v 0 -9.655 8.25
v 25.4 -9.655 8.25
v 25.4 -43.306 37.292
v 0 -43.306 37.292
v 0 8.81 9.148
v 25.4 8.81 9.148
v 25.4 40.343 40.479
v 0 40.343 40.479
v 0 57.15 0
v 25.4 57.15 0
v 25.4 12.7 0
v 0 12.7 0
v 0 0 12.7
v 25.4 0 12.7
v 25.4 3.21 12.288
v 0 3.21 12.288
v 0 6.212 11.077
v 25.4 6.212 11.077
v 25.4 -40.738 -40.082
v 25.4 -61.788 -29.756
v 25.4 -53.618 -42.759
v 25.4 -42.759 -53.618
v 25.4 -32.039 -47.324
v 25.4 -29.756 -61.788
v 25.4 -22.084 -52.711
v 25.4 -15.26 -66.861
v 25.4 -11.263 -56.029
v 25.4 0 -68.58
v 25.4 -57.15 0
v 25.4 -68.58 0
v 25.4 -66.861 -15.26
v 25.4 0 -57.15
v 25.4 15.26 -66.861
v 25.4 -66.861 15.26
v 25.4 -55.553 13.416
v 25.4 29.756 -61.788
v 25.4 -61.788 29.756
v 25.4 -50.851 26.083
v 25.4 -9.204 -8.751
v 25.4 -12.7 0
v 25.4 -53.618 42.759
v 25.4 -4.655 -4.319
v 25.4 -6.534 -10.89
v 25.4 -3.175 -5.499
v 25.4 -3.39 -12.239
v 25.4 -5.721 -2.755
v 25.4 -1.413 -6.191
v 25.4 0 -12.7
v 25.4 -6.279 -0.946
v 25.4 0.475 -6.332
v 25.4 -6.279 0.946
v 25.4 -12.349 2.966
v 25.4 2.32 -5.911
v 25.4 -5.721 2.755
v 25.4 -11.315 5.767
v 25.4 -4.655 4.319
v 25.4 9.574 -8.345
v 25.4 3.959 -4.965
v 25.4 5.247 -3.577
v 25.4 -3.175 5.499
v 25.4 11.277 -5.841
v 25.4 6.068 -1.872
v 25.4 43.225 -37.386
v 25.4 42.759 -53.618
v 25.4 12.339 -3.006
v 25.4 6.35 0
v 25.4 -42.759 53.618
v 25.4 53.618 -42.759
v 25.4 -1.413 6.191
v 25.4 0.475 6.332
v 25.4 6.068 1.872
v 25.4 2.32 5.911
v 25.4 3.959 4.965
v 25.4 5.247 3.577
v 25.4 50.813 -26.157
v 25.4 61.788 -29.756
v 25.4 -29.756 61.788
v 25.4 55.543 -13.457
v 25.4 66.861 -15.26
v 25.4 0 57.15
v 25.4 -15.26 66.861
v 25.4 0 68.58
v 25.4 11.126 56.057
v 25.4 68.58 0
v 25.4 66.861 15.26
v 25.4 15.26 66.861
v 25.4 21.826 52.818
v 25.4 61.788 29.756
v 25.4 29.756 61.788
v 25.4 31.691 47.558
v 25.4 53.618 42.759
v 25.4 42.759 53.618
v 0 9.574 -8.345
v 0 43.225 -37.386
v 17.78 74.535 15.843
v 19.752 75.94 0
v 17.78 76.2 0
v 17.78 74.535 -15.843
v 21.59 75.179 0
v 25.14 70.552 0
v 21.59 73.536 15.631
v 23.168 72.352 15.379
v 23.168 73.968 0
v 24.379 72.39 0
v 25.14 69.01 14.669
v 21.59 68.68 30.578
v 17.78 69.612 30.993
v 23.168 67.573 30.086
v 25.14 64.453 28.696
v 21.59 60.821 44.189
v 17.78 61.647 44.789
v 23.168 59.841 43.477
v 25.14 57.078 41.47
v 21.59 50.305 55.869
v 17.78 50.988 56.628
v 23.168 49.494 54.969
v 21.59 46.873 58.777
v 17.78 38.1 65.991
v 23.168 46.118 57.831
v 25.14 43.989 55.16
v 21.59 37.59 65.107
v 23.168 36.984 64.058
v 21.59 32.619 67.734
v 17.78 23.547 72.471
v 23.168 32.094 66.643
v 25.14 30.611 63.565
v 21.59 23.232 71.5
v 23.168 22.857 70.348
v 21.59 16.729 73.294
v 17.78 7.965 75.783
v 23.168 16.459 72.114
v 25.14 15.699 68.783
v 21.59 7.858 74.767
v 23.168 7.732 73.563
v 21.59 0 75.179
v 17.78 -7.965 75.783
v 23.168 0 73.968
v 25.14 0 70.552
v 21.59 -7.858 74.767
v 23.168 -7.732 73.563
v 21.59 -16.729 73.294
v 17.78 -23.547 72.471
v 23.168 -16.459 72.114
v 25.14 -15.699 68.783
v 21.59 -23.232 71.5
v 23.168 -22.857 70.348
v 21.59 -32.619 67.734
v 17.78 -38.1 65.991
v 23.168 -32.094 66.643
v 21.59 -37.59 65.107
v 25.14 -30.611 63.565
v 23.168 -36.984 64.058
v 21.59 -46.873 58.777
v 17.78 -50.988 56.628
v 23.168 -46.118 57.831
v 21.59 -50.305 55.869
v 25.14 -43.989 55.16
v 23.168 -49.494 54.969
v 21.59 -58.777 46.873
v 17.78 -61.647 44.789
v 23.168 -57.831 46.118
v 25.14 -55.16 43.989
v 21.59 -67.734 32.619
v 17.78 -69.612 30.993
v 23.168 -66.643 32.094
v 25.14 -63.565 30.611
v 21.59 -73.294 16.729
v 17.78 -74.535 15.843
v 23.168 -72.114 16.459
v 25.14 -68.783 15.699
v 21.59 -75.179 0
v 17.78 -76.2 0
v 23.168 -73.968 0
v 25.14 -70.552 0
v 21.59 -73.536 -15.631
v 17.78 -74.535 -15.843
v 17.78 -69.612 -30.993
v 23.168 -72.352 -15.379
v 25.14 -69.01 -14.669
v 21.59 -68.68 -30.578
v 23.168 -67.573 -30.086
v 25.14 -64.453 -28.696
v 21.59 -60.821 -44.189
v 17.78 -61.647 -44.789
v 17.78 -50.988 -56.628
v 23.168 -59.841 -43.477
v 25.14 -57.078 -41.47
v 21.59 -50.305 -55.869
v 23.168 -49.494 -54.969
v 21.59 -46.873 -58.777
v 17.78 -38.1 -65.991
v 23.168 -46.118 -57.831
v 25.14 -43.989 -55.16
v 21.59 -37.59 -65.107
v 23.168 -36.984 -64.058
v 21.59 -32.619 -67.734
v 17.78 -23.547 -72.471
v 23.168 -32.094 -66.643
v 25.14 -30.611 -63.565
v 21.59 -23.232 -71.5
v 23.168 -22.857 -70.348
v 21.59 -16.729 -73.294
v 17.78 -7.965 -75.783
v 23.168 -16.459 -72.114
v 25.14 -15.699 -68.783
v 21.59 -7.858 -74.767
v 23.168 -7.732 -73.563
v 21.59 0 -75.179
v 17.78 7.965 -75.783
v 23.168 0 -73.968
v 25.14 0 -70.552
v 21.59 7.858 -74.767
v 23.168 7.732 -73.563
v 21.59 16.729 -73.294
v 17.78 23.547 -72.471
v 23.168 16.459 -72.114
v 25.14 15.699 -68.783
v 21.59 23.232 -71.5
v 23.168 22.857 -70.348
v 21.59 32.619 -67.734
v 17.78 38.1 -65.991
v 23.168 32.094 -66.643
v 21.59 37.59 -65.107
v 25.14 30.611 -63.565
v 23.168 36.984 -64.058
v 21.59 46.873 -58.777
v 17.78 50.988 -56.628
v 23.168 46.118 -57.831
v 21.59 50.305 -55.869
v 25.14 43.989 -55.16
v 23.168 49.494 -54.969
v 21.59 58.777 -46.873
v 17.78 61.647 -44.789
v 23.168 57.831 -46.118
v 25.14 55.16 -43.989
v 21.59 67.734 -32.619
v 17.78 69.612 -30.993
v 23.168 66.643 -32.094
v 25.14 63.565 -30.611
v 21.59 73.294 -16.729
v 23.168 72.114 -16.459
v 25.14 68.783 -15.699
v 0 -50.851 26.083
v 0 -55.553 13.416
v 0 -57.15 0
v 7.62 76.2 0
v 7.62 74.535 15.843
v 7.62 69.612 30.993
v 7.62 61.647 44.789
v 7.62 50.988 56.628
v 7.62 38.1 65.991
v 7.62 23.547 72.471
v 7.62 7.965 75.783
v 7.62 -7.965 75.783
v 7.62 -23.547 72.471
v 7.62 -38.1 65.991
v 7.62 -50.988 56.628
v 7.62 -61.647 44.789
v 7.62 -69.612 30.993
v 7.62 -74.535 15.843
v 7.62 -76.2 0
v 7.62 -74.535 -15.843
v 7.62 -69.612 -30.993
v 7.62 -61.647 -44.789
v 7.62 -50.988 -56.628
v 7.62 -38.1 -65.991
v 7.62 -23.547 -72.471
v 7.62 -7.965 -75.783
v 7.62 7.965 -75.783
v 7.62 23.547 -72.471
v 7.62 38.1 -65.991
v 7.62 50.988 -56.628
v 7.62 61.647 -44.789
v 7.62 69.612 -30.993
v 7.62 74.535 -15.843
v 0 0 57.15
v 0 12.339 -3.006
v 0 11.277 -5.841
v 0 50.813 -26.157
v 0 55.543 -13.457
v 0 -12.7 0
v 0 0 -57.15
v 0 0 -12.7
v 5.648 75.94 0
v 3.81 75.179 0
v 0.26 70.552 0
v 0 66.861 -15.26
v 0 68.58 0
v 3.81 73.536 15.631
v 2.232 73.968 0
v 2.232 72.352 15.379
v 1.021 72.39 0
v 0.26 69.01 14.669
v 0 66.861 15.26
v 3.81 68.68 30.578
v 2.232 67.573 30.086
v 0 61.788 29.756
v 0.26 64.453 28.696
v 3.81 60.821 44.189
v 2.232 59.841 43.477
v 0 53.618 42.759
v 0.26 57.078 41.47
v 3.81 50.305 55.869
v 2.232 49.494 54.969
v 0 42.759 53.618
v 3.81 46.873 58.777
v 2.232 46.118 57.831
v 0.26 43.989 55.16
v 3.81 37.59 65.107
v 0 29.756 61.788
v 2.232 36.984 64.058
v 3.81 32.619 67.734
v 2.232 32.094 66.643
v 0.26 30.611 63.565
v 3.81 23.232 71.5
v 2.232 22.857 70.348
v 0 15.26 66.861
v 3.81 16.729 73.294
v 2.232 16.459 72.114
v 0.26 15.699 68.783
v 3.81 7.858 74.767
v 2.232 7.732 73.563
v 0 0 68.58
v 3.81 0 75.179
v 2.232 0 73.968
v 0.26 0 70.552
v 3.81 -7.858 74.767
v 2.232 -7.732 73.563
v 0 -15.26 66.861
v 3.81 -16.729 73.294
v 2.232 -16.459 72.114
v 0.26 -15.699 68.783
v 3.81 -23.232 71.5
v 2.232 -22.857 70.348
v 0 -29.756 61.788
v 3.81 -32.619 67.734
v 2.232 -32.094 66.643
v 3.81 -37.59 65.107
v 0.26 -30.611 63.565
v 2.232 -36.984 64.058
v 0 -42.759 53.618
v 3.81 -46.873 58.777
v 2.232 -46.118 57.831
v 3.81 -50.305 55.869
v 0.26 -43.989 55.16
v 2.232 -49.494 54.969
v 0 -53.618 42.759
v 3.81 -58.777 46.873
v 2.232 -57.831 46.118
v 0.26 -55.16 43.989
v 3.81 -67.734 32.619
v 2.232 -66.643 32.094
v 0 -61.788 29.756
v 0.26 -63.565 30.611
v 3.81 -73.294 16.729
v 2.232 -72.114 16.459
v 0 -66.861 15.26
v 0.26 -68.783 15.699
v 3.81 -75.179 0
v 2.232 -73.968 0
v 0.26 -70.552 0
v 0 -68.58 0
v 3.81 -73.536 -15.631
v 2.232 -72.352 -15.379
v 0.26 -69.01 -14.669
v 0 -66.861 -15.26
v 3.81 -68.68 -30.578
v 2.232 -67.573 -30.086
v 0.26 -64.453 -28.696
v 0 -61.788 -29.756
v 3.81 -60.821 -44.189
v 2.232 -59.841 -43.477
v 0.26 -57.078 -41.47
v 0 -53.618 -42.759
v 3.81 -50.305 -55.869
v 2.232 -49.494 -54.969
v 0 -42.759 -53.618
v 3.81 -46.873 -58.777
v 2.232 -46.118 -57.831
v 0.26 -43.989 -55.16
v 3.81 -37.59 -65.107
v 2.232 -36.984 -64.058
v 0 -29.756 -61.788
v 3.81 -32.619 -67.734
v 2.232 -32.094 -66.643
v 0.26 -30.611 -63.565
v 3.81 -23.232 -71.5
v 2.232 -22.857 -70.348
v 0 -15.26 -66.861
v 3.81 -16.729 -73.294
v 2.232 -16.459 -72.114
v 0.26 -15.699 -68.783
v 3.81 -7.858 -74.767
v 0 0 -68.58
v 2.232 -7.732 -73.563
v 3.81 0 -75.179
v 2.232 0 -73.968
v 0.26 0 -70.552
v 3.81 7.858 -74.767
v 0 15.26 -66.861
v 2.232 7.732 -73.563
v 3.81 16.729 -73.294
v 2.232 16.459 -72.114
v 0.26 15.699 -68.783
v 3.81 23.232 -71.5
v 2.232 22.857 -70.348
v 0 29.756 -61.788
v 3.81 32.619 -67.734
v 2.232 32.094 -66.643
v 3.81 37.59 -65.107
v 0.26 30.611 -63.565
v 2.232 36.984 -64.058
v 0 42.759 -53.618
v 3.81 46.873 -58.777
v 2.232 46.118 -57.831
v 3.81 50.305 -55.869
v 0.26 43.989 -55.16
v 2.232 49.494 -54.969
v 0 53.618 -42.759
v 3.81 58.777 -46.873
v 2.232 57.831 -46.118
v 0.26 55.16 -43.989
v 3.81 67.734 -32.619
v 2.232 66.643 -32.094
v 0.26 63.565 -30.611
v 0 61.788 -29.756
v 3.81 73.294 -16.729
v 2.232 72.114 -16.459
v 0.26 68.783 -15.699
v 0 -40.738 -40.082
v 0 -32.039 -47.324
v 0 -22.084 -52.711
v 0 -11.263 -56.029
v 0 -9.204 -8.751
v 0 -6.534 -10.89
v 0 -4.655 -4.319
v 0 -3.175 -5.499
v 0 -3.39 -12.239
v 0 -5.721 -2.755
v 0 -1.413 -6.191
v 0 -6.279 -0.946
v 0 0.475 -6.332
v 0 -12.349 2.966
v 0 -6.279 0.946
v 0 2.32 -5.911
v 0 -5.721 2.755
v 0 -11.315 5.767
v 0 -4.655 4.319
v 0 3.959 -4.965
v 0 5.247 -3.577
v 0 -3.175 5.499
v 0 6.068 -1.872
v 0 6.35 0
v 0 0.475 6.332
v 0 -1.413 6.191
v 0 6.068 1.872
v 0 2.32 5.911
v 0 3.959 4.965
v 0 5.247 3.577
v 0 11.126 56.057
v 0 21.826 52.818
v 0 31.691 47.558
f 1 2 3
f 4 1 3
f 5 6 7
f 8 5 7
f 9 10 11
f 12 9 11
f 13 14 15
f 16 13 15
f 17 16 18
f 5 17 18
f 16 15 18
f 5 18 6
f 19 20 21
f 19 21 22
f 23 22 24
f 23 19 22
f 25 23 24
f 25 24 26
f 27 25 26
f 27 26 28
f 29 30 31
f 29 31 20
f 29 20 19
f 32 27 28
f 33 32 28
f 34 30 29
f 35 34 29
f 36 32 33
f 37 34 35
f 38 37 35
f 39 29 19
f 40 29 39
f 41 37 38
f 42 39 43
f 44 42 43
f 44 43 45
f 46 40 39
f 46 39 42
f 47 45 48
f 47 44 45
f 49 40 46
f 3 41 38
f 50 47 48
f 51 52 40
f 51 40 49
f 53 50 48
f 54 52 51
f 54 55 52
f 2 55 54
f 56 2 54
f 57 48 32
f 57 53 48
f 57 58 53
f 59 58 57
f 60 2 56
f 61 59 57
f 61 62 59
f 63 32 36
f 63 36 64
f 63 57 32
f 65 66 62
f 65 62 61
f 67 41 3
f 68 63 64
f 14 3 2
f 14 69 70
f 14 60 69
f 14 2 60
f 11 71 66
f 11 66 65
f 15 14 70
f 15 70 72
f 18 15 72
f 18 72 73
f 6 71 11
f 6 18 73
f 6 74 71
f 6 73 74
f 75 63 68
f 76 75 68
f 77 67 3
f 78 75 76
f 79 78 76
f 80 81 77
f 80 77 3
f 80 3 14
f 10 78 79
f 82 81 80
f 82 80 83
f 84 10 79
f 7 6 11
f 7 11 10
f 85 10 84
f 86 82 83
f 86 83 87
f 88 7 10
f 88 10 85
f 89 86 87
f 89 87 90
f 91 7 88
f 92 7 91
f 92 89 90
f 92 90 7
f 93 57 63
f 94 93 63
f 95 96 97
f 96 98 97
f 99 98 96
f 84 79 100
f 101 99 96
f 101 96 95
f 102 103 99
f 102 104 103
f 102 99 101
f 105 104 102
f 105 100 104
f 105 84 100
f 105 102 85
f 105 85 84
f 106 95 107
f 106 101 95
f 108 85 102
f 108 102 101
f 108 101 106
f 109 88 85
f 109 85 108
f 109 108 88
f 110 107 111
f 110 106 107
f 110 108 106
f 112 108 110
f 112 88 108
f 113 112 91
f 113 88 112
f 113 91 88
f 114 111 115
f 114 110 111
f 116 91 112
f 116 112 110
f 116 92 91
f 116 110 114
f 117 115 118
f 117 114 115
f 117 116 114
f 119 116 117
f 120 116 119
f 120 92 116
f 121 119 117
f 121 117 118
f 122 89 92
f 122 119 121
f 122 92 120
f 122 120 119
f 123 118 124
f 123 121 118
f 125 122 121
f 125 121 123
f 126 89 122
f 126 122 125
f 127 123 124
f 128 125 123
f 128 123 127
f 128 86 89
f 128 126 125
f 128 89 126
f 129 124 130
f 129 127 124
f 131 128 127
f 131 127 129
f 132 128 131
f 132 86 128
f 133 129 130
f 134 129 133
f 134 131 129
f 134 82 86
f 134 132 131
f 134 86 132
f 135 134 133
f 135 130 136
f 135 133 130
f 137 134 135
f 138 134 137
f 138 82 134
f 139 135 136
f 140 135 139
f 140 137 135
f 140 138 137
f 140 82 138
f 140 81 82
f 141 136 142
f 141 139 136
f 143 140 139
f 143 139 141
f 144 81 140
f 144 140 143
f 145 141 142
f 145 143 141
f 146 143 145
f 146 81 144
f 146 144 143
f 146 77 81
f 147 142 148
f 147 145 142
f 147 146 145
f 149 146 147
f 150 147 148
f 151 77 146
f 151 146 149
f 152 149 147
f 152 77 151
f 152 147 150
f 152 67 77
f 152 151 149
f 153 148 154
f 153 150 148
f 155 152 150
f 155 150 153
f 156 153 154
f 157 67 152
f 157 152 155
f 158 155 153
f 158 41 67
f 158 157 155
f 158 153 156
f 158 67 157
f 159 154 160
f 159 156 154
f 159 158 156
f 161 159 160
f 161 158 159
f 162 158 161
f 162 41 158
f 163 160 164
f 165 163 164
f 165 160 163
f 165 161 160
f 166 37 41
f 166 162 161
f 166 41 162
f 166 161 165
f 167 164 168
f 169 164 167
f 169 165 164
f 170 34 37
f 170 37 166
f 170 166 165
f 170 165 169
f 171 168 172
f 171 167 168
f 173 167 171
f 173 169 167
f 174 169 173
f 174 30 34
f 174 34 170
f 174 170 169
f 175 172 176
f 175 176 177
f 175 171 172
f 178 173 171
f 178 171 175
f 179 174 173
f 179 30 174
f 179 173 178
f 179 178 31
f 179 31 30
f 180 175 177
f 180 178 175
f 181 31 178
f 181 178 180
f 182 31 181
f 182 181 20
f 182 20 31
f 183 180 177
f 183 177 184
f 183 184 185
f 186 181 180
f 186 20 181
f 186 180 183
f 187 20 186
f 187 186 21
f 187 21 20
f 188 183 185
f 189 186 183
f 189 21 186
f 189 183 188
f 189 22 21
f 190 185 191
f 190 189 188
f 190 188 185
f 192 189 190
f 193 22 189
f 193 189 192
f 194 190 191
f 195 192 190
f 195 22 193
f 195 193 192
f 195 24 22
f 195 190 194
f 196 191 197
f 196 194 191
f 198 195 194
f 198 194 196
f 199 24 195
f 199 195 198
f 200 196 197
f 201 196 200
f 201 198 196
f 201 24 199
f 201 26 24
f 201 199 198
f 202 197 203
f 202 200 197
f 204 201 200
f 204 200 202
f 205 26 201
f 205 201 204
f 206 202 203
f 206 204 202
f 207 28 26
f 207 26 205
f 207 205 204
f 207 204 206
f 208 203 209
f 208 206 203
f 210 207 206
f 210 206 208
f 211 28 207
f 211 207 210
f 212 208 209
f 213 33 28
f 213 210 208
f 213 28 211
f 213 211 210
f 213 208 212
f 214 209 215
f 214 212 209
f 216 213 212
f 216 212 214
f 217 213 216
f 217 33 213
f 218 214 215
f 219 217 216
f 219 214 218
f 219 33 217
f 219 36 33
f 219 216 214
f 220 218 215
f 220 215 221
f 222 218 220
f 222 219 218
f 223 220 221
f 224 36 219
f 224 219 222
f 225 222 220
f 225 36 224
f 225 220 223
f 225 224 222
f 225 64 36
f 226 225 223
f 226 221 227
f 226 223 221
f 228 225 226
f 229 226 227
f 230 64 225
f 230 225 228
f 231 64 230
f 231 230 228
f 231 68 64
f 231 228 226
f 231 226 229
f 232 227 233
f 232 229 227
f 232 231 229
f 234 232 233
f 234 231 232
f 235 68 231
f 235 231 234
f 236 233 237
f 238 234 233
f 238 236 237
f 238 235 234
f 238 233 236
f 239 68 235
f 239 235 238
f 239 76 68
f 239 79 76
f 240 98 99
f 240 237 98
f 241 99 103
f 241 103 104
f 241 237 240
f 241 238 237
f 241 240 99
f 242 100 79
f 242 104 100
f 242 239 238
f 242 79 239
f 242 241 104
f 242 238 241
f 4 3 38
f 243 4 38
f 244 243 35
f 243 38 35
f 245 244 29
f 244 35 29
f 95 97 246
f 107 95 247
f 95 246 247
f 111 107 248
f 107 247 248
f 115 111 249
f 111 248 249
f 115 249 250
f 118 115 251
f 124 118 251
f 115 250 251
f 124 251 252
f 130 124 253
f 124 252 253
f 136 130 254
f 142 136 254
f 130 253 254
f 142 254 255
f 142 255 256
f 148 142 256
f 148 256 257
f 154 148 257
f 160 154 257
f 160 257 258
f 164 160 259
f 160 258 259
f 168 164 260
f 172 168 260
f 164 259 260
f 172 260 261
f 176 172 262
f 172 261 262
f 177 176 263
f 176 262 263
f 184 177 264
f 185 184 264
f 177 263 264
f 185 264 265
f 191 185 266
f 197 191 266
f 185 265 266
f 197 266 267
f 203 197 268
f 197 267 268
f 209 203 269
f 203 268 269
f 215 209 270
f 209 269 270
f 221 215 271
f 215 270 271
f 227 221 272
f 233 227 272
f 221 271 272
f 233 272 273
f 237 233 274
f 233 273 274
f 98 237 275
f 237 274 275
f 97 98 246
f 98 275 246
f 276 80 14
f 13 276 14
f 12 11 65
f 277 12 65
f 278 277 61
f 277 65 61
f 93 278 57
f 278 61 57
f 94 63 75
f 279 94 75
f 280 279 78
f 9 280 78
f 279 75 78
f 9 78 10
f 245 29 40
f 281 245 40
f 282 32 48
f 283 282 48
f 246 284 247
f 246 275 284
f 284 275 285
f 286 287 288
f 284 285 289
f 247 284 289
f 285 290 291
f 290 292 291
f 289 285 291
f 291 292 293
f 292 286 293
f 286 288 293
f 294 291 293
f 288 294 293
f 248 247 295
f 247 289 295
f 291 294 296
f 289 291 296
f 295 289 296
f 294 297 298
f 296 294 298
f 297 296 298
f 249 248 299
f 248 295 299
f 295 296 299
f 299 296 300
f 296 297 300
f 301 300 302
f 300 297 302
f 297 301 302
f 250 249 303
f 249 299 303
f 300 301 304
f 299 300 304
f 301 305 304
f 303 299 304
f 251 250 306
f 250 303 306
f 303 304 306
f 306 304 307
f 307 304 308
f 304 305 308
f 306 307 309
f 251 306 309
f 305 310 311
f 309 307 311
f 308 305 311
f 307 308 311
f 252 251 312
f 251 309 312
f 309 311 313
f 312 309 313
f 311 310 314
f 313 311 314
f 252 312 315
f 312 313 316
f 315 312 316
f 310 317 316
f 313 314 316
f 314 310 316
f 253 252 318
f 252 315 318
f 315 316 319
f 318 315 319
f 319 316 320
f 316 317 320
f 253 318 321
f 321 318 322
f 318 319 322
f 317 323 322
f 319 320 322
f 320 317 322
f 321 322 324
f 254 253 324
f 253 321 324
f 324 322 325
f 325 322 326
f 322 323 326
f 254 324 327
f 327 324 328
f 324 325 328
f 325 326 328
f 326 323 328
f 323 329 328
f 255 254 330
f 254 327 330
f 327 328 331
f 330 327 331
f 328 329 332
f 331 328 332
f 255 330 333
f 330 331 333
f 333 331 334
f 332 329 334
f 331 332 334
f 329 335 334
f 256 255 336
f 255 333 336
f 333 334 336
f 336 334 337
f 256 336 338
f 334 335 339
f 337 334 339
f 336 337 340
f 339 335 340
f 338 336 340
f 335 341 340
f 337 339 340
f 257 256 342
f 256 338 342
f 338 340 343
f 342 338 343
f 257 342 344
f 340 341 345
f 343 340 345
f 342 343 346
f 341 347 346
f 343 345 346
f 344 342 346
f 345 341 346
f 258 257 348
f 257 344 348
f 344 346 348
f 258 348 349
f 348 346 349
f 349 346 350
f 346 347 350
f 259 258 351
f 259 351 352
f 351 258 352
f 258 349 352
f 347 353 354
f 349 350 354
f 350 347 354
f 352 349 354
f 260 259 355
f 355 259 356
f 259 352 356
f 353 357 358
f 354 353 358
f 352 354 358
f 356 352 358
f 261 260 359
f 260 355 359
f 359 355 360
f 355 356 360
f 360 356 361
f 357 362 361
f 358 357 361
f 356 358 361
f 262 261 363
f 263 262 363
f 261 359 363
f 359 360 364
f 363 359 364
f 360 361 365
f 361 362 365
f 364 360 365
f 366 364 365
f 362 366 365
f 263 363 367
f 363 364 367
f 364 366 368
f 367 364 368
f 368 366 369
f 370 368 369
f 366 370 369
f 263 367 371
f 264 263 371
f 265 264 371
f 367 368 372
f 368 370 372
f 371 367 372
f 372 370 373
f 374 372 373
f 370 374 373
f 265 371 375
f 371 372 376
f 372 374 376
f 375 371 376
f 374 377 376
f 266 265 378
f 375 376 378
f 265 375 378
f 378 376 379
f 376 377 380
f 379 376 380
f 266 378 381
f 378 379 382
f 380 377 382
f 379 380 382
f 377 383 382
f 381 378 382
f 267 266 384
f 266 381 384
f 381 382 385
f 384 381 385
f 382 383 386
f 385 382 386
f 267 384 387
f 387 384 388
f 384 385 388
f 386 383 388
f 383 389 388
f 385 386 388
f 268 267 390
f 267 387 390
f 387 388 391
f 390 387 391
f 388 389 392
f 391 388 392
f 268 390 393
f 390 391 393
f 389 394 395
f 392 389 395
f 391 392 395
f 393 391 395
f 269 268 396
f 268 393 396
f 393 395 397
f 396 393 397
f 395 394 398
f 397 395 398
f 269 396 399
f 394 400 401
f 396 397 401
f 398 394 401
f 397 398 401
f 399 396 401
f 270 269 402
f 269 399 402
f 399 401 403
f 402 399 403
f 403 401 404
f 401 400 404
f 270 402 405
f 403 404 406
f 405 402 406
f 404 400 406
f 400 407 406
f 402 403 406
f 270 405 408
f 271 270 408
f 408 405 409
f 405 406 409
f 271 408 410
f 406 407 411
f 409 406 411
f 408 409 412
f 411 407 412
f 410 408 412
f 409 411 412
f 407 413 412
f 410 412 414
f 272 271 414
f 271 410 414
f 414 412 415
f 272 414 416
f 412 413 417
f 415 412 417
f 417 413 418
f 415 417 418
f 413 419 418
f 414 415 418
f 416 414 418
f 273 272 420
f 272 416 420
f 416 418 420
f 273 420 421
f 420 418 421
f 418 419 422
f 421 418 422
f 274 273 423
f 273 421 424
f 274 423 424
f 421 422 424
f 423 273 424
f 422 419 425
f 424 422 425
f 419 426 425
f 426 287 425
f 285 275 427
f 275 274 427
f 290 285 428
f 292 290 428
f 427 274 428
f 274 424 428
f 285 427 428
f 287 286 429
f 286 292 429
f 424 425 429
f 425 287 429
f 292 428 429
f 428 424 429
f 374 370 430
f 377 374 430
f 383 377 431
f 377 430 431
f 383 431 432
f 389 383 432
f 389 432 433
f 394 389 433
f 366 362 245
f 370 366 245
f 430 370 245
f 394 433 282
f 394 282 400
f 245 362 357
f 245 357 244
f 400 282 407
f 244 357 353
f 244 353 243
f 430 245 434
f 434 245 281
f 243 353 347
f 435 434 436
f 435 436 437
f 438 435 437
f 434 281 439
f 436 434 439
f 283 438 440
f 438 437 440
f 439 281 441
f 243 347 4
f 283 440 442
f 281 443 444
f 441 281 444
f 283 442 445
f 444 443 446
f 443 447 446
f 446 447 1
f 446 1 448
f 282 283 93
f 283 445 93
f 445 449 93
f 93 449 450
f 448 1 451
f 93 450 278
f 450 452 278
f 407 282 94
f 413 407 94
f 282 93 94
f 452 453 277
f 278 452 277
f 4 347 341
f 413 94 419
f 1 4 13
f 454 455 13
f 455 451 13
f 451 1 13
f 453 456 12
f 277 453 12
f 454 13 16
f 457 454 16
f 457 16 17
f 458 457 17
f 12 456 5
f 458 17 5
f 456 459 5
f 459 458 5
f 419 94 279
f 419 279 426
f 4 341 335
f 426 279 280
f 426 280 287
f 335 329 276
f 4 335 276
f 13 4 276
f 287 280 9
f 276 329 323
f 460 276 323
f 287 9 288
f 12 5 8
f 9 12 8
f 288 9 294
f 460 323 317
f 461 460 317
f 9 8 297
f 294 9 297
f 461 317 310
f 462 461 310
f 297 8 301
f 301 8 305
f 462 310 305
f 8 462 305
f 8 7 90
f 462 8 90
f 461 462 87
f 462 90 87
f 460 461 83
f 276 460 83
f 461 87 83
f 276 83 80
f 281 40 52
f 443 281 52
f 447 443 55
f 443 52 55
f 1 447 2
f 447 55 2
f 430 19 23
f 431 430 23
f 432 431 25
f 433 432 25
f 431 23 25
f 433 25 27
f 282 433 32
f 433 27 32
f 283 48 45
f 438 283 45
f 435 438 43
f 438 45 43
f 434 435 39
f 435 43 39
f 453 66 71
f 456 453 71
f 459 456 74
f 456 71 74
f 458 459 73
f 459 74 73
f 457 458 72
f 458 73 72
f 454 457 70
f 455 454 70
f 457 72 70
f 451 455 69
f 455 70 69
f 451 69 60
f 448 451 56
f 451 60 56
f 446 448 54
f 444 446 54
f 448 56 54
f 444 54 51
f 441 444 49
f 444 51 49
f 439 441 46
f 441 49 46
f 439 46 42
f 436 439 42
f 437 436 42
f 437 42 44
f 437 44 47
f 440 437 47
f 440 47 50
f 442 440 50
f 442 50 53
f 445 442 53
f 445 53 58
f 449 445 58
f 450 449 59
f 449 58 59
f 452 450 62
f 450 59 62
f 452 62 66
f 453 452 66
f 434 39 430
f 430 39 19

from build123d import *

# Parameters (mm, degrees)
F0_R     = 76.2
F1_DEPTH = 25.4
F2_R     = 6.35
F3_DEPTH = 25.4
F5_DEPTH = 25.4
F6_R     = 7.62


with BuildPart() as f1:
    # F0 (on Right) → F1 (new body)
    with BuildSketch(Plane.YZ):
        Circle(F0_R)
    extrude(amount=F1_DEPTH)

    # F2 (on face) → F3 (cut)
    with BuildSketch(Plane.YZ.offset(25.4)):
        Circle(F2_R)
    extrude(amount=-F3_DEPTH, mode=Mode.SUBTRACT)

    # F4 (on face) → F5 (cut)
    with BuildSketch(Plane.YZ.offset(25.4)):
        with BuildLine():
            ThreePointArc((-40.737736199, -40.0819080058), (-22.0844001217, -52.7105470591), (0, -57.15))
            Line((0, -57.15), (0, -12.7))
            ThreePointArc((0, -12.7), (-5.0078416892, -11.6709691807), (-9.2041521286, -8.7506333253))
            Line((-9.2041521286, -8.7506333253), (-40.737736199, -40.0819080058))
        make_face()
        with BuildLine():
            ThreePointArc((43.2249520119, -37.3861742301), (53.5557116818, -19.947637611), (57.15, 0))
            Line((57.15, 0), (12.7, 0))
            ThreePointArc((12.7, 0), (11.89277789, -4.4555397045), (9.5737269199, -8.3446841081))
            Line((9.5737269199, -8.3446841081), (43.2249520119, -37.3861742301))
        make_face()
        with BuildLine():
            Line((8.8096923922, 9.1476401304), (40.3432764626, 40.4789148108))
            ThreePointArc((40.3432764626, 40.4789148108), (21.8260454338, 52.8180484373), (0, 57.15))
            Line((0, 57.15), (0, 12.7))
            ThreePointArc((0, 12.7), (4.749472094, 11.7784767618), (8.8096923922, 9.1476401304))
        make_face()
        with BuildLine():
            Line((-9.6552608984, 8.2502082994), (-43.3064859904, 37.2916984215))
            ThreePointArc((-43.3064859904, 37.2916984215), (-53.57745876, 19.889153145), (-57.15, 0))
            Line((-57.15, 0), (-12.7, 0))
            ThreePointArc((-12.7, 0), (-11.9145250306, 4.3970550708), (-9.6552608984, 8.2502082994))
        make_face()
    extrude(amount=-F5_DEPTH, mode=Mode.SUBTRACT)

    # F6
    f6_edges = [f1.edges().sort_by_distance(p)[0] for p in [
        (25.4, -76.2, 0),
        (0, -76.2, 0),
    ]]
    fillet(f6_edges, radius=F6_R)


solid = f1.part
